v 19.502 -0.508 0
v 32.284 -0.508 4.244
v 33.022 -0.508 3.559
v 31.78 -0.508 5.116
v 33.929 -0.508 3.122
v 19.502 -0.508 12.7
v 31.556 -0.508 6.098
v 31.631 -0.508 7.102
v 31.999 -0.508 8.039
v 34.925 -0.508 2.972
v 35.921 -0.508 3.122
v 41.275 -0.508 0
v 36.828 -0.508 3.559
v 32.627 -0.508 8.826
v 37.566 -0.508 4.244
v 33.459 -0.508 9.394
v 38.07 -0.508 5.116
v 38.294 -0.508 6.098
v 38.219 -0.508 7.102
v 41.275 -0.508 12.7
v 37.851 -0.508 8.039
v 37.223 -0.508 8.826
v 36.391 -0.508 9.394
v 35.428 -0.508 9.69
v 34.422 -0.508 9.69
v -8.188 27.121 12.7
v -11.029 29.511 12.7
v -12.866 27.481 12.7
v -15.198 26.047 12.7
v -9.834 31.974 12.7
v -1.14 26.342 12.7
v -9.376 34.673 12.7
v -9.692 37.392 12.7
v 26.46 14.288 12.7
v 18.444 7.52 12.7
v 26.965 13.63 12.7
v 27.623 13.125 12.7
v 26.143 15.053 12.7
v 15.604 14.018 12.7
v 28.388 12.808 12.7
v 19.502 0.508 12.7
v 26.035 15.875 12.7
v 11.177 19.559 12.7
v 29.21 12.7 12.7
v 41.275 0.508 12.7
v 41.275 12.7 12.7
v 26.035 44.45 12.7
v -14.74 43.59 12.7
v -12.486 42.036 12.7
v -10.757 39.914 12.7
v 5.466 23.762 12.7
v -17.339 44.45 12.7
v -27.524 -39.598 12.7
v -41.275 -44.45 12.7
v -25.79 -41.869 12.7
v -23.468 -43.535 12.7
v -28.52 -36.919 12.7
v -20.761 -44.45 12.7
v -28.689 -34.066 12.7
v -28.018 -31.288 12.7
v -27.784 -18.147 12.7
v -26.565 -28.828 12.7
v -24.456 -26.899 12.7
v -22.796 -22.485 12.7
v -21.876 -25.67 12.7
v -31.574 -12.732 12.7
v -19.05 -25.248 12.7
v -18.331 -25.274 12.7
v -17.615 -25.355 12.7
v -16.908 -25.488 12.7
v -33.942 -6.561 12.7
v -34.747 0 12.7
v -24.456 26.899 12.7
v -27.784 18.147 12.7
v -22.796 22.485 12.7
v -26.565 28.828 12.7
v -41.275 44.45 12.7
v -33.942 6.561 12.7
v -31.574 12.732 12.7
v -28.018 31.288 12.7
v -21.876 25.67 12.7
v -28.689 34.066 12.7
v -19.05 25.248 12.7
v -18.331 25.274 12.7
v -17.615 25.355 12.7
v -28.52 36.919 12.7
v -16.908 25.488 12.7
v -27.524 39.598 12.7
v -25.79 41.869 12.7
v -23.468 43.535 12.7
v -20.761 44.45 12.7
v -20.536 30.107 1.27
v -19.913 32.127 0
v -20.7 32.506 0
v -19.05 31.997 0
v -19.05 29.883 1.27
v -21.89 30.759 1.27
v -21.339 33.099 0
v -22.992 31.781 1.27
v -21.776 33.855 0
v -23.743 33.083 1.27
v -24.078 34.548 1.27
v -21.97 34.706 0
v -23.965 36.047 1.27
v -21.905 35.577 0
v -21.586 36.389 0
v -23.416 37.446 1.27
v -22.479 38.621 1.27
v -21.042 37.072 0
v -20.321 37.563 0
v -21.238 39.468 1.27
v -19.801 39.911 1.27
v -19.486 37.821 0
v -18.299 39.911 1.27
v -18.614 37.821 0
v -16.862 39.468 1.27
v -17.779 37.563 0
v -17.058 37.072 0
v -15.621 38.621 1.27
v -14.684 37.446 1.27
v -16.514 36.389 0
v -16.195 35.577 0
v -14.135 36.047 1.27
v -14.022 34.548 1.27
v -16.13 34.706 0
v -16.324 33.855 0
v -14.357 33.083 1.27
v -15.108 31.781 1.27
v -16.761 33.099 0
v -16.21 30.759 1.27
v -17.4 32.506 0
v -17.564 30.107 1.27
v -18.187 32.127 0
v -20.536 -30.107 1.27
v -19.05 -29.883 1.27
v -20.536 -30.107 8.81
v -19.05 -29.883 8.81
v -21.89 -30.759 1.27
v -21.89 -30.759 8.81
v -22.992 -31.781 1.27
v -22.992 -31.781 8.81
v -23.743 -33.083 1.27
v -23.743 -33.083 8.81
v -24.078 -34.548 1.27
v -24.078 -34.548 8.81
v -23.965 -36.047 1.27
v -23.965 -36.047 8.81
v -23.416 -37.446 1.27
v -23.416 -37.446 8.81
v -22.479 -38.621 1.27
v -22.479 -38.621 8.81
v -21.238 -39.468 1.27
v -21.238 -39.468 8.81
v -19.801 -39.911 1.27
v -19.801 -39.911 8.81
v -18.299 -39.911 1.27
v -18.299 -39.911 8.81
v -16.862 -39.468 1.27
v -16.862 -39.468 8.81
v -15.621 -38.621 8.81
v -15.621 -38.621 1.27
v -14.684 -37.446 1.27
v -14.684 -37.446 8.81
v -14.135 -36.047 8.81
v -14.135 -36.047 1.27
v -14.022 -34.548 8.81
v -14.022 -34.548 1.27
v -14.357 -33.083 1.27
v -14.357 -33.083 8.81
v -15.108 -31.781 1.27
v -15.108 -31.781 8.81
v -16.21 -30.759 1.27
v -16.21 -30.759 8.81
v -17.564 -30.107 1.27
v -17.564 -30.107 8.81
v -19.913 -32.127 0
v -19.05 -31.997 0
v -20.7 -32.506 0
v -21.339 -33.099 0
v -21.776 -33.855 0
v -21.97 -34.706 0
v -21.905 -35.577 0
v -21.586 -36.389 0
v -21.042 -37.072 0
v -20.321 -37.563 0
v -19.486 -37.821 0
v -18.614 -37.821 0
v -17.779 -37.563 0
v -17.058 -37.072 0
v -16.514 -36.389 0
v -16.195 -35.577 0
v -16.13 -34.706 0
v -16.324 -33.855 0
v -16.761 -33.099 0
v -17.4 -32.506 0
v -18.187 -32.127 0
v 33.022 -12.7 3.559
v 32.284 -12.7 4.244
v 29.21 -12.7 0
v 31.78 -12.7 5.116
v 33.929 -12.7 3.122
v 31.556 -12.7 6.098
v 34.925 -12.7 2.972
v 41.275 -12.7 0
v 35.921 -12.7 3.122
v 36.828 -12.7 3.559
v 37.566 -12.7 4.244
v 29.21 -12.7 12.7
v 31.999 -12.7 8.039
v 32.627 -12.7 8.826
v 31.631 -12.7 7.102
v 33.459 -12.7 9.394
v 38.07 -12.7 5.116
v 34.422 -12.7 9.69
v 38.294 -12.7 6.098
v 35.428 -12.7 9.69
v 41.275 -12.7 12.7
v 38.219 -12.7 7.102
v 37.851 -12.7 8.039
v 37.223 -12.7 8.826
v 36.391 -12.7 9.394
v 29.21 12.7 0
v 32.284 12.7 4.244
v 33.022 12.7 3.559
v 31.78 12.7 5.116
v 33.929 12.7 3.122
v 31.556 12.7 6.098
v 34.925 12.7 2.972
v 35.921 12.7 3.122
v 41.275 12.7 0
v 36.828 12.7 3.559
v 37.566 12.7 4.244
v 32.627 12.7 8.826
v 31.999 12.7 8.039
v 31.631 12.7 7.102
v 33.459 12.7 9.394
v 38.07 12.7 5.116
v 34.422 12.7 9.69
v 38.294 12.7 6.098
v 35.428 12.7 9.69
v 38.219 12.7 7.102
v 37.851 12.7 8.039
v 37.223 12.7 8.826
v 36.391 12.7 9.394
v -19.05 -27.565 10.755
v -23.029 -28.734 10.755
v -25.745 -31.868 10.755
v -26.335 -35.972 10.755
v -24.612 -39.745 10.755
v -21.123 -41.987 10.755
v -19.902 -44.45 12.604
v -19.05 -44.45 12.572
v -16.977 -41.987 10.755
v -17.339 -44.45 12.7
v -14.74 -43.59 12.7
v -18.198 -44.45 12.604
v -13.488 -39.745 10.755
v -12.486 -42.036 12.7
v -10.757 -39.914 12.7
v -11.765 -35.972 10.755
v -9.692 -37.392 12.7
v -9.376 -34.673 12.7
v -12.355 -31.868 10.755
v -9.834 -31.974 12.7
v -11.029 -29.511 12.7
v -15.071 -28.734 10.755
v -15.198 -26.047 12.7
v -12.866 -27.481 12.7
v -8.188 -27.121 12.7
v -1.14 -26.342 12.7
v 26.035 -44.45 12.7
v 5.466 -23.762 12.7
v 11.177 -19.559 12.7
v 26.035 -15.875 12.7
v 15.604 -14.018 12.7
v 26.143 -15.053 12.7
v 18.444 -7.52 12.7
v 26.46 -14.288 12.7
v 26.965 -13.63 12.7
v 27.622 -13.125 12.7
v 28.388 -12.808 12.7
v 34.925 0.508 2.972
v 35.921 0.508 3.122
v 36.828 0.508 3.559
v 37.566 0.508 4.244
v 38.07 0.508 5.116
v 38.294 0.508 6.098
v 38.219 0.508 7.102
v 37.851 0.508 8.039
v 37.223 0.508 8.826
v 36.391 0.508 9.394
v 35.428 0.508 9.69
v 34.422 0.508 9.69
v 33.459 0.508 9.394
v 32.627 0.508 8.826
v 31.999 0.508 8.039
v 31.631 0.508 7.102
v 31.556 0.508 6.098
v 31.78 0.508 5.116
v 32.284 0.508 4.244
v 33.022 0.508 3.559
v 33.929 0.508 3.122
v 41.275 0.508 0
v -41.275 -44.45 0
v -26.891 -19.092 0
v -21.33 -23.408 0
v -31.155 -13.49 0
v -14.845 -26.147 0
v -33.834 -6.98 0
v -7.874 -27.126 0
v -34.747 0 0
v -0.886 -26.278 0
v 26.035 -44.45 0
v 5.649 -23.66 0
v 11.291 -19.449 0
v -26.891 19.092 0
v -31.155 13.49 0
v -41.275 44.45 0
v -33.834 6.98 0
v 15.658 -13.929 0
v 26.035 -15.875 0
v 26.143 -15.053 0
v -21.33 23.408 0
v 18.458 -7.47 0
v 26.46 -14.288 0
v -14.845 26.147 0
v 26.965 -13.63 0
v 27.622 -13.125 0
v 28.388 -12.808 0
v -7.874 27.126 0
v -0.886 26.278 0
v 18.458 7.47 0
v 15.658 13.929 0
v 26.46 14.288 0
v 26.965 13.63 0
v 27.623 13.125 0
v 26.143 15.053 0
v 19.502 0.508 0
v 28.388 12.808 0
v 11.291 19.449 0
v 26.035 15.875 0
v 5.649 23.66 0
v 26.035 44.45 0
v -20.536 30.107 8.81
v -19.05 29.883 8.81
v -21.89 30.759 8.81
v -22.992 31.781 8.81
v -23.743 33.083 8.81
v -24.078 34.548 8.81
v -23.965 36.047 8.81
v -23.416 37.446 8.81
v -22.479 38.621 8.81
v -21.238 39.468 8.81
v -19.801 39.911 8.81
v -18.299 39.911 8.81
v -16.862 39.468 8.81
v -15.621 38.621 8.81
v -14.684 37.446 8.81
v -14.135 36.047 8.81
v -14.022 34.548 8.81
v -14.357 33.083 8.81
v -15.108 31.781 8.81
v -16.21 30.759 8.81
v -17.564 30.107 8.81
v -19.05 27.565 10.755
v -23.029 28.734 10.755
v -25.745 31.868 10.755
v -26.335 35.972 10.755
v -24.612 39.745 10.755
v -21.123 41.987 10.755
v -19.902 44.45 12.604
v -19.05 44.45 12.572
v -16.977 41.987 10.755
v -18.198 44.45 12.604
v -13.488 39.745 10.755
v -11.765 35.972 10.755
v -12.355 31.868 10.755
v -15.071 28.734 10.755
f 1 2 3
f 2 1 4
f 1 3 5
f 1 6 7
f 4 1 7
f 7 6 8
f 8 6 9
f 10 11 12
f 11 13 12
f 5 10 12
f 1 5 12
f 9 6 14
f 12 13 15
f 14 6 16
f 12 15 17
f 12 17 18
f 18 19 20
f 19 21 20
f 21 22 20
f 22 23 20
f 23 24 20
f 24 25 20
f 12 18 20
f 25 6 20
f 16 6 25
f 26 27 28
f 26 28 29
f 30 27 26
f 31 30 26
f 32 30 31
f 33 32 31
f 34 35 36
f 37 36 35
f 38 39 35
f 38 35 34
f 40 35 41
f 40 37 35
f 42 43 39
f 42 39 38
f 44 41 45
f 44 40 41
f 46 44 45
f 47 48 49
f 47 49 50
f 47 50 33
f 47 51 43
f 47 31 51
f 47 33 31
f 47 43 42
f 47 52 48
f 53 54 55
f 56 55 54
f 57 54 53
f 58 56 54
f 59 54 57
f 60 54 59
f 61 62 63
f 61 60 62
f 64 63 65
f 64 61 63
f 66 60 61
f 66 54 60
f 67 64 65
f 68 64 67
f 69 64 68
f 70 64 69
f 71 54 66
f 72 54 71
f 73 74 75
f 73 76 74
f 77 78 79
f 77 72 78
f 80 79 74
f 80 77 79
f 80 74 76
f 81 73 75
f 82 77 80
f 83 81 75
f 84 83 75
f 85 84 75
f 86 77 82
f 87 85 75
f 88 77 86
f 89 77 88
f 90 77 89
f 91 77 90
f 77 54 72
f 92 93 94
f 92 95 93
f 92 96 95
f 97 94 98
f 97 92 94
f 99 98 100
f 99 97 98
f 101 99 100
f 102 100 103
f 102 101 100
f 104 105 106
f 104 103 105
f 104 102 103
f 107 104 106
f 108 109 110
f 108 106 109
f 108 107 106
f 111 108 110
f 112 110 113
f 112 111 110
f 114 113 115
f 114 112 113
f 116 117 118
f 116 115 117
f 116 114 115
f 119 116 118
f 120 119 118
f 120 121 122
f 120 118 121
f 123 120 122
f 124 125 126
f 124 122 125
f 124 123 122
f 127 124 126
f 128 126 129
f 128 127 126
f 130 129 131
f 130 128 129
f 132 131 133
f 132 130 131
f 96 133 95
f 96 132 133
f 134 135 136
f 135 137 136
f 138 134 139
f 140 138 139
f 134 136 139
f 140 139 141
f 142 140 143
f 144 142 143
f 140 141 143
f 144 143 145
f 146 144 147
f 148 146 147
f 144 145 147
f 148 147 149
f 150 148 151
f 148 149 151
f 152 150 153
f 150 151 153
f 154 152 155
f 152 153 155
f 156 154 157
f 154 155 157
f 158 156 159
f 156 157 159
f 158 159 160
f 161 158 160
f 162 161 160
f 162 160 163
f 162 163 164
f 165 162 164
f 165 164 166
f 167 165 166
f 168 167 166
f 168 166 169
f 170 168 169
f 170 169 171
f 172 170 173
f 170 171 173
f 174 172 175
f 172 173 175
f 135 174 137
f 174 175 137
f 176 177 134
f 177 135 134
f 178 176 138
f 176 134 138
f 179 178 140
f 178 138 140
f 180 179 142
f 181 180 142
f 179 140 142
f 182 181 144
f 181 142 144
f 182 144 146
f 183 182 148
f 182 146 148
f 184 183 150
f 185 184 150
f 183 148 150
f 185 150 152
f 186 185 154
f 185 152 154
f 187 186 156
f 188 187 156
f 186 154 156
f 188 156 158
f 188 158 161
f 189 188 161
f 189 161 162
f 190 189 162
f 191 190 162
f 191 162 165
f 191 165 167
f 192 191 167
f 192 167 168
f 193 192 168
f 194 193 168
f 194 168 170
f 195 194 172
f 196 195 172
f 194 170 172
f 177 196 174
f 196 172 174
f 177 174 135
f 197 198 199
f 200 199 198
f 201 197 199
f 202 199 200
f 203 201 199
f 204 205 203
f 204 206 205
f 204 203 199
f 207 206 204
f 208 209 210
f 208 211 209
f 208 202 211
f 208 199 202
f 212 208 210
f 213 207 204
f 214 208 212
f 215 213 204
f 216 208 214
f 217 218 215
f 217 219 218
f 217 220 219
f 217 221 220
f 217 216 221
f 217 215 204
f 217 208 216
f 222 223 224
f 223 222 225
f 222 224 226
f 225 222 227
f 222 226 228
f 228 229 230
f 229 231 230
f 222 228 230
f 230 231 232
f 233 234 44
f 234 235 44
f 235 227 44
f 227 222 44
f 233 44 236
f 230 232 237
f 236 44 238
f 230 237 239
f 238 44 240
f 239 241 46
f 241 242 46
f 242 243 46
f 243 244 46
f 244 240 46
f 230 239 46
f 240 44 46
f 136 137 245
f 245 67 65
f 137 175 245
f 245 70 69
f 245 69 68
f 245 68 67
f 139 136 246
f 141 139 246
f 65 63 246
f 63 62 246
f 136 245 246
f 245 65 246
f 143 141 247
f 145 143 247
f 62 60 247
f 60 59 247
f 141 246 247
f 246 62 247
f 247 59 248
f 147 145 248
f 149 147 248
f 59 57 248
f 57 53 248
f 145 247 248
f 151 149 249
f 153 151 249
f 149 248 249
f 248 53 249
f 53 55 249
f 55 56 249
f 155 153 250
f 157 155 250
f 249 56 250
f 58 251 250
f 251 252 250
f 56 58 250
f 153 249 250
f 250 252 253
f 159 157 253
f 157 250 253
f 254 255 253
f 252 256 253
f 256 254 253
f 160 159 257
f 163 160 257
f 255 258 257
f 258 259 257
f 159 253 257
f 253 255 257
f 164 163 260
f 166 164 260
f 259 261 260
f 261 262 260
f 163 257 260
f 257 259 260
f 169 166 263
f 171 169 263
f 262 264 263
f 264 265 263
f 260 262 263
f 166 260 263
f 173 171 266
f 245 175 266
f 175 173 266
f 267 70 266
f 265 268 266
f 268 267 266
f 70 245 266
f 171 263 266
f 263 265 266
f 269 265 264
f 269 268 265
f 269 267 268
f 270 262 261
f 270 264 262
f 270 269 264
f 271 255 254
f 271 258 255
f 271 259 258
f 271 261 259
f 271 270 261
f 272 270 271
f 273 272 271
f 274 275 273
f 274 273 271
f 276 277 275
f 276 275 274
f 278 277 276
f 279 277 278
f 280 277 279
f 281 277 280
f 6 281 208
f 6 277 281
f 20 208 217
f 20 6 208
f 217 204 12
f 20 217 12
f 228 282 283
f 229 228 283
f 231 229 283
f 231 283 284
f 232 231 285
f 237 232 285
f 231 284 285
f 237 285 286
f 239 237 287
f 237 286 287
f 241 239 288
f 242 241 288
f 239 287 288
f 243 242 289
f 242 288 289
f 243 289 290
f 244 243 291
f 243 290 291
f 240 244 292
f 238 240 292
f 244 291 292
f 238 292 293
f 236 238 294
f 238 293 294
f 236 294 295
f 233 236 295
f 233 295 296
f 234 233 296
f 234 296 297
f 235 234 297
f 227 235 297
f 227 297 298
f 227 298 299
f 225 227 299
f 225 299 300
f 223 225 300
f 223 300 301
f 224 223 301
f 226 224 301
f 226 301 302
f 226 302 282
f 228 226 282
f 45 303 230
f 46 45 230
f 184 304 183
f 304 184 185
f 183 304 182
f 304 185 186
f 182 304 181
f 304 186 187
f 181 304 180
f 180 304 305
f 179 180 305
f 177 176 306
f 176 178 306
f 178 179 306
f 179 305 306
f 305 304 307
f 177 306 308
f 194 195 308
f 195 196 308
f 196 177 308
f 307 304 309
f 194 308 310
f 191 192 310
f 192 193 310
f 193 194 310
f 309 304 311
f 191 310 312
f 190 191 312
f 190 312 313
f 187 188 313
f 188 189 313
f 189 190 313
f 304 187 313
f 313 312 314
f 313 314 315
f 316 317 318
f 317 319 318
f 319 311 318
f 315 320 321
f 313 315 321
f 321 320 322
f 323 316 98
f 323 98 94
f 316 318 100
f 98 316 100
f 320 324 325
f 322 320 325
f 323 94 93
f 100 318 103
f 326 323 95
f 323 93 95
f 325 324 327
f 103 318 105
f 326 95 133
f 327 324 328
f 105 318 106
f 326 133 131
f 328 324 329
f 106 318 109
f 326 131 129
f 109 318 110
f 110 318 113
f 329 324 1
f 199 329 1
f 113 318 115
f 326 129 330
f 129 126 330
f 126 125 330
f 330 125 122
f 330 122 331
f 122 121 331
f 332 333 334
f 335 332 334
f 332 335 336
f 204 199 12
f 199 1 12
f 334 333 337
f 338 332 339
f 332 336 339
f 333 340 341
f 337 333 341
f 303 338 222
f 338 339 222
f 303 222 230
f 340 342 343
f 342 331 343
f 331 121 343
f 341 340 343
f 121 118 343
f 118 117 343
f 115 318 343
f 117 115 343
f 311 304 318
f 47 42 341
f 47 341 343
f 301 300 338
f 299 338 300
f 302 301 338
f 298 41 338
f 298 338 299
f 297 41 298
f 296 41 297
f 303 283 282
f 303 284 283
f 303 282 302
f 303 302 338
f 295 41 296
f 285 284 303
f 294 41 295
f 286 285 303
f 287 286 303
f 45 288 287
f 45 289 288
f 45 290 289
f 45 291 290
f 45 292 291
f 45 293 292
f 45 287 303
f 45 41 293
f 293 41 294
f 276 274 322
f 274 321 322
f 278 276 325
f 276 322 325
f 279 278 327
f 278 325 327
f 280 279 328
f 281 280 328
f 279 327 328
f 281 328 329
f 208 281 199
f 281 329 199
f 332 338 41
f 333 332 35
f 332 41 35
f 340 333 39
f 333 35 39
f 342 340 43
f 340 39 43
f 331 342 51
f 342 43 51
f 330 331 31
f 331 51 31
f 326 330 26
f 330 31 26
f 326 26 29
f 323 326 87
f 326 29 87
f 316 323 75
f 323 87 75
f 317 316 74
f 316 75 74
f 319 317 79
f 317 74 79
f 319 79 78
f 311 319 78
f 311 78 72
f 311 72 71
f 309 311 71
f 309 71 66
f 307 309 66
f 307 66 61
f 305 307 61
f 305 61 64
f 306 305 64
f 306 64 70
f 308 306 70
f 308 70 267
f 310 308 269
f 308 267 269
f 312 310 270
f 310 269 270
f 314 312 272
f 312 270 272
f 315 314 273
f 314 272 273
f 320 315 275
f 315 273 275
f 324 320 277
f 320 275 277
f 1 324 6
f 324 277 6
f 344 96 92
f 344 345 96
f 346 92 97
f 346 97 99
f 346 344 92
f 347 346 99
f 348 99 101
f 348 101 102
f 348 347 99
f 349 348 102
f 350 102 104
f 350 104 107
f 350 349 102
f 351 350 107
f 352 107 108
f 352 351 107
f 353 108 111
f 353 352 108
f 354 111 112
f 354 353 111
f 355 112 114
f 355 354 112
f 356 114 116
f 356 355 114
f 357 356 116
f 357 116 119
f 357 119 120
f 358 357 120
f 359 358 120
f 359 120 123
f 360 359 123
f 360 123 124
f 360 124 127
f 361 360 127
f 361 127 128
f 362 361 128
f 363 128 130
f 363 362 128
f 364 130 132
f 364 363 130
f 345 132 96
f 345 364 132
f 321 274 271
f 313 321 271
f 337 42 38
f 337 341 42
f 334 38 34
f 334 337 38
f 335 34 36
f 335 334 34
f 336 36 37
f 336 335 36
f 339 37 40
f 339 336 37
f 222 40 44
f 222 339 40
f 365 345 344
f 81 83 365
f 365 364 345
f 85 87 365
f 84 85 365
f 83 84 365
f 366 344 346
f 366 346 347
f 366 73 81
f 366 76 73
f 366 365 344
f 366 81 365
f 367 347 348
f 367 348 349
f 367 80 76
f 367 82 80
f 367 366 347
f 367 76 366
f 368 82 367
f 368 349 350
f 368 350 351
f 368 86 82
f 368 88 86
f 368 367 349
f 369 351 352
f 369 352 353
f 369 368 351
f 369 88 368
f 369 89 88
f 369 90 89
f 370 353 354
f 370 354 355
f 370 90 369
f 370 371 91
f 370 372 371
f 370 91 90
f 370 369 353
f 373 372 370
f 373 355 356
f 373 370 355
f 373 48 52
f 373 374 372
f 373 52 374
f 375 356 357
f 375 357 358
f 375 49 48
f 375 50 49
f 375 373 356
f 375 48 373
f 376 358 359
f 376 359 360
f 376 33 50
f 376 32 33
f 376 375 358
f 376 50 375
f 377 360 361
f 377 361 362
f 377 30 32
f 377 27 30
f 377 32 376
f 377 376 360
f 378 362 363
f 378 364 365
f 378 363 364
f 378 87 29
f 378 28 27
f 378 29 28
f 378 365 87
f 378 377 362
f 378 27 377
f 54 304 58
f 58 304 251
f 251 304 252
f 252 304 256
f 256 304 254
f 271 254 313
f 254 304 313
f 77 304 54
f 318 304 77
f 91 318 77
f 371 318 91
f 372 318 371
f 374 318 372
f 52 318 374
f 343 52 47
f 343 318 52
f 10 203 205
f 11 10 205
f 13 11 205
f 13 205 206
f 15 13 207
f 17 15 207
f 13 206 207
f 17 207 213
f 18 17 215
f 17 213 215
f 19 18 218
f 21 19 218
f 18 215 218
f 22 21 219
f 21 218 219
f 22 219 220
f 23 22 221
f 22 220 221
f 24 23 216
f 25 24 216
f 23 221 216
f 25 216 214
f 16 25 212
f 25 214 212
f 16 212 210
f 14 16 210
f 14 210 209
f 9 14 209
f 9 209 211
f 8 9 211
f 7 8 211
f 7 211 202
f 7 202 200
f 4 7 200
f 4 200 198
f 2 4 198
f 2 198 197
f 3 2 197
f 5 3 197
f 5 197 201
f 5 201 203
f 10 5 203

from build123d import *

# Parameters (mm, degrees)
SKETCH1_W               = 82.55
SKETCH1_H               = 88.9
EXTRUDE1_DEPTH          = 12.7
SKETCH2_R               = 27.1272
EXTRUDE2_DEPTH          = 62.973527615
SKETCH3_W               = 28.468633454
SKETCH3_H               = 1.016
EXTRUDE3_DEPTH          = 62.973527615
F_1_4_CLEARANCE_HOLE1_D = 6.7564
SKETCH10_W              = 15.24
SKETCH10_H              = 31.75
EXTRUDE4_DEPTH          = 62.973527707
FILLET1_R               = 3.175


with BuildPart() as part:
    # Sketch1 → Extrude1 (new body)
    with BuildSketch(Plane.XY):
        Rectangle(SKETCH1_W, SKETCH1_H)
    extrude(amount=EXTRUDE1_DEPTH)

    # Sketch2 → Extrude2 (cut, through all)
    with BuildSketch(Plane.XY.offset(12.7)):
        with Locations((-7.62, 0)):
            Circle(SKETCH2_R)
    extrude(amount=-EXTRUDE2_DEPTH, mode=Mode.SUBTRACT)

    # Sketch3 → Extrude3 (cut, through all)
    with BuildSketch(Plane.XY.offset(12.7)):
        with Locations((30.3911, 0)):
            Rectangle(SKETCH3_W, SKETCH3_H)
    extrude(amount=-EXTRUDE3_DEPTH, mode=Mode.SUBTRACT)

    # 1/4 Clearance Hole1 (through all)
    with Locations(Plane(origin=(34.925, 44.45, 6.35), x_dir=(0, 0, 1), z_dir=(0, 1, 0))):
        with Locations((0, 0)):
            Hole(F_1_4_CLEARANCE_HOLE1_D / 2)

    # Sketch9 → CSK for 3/8 Flat Head Machine Screw (100)1 (revolve, cut)
    with BuildSketch(Plane(origin=(-19.05, 34.925, 12.7), x_dir=(0, -1, 0), z_dir=(1, 0, 0))):
        Polygon((0, 0), (0, 14.459479155), (5.0419, 11.43), (5.0419, 3.88964634), (9.6774, 0), align=None)
    csk_for_3_8_flat_head_machine_screw_100 = revolve(axis=Axis((-19.05, 34.925, 19.05), (0, 0, -1)), mode=Mode.SUBTRACT)

    # Mirror1: CSK for 3/8 Flat Head Machine Screw (100)1 across plane
    add(csk_for_3_8_flat_head_machine_screw_100.mirror(Plane.ZX), mode=Mode.SUBTRACT)

    # Sketch10 → Extrude4 (cut, through all)
    with BuildSketch(Plane.XY.offset(12.7)):
        with Locations((33.655, 28.575)):
            Rectangle(SKETCH10_W, SKETCH10_H)
    extrude4 = extrude(amount=-EXTRUDE4_DEPTH, mode=Mode.SUBTRACT)

    # Mirror2: Extrude4 across plane
    add(extrude4.mirror(Plane.ZX), mode=Mode.SUBTRACT)

    # Fillet1
    fillet1_edges = [part.edges().sort_by_distance(p)[0] for p in [
        (26.035, -12.7, 6.35),
        (26.035, 12.7, 6.35),
    ]]
    fillet(fillet1_edges, radius=FILLET1_R)


solid = part.part
